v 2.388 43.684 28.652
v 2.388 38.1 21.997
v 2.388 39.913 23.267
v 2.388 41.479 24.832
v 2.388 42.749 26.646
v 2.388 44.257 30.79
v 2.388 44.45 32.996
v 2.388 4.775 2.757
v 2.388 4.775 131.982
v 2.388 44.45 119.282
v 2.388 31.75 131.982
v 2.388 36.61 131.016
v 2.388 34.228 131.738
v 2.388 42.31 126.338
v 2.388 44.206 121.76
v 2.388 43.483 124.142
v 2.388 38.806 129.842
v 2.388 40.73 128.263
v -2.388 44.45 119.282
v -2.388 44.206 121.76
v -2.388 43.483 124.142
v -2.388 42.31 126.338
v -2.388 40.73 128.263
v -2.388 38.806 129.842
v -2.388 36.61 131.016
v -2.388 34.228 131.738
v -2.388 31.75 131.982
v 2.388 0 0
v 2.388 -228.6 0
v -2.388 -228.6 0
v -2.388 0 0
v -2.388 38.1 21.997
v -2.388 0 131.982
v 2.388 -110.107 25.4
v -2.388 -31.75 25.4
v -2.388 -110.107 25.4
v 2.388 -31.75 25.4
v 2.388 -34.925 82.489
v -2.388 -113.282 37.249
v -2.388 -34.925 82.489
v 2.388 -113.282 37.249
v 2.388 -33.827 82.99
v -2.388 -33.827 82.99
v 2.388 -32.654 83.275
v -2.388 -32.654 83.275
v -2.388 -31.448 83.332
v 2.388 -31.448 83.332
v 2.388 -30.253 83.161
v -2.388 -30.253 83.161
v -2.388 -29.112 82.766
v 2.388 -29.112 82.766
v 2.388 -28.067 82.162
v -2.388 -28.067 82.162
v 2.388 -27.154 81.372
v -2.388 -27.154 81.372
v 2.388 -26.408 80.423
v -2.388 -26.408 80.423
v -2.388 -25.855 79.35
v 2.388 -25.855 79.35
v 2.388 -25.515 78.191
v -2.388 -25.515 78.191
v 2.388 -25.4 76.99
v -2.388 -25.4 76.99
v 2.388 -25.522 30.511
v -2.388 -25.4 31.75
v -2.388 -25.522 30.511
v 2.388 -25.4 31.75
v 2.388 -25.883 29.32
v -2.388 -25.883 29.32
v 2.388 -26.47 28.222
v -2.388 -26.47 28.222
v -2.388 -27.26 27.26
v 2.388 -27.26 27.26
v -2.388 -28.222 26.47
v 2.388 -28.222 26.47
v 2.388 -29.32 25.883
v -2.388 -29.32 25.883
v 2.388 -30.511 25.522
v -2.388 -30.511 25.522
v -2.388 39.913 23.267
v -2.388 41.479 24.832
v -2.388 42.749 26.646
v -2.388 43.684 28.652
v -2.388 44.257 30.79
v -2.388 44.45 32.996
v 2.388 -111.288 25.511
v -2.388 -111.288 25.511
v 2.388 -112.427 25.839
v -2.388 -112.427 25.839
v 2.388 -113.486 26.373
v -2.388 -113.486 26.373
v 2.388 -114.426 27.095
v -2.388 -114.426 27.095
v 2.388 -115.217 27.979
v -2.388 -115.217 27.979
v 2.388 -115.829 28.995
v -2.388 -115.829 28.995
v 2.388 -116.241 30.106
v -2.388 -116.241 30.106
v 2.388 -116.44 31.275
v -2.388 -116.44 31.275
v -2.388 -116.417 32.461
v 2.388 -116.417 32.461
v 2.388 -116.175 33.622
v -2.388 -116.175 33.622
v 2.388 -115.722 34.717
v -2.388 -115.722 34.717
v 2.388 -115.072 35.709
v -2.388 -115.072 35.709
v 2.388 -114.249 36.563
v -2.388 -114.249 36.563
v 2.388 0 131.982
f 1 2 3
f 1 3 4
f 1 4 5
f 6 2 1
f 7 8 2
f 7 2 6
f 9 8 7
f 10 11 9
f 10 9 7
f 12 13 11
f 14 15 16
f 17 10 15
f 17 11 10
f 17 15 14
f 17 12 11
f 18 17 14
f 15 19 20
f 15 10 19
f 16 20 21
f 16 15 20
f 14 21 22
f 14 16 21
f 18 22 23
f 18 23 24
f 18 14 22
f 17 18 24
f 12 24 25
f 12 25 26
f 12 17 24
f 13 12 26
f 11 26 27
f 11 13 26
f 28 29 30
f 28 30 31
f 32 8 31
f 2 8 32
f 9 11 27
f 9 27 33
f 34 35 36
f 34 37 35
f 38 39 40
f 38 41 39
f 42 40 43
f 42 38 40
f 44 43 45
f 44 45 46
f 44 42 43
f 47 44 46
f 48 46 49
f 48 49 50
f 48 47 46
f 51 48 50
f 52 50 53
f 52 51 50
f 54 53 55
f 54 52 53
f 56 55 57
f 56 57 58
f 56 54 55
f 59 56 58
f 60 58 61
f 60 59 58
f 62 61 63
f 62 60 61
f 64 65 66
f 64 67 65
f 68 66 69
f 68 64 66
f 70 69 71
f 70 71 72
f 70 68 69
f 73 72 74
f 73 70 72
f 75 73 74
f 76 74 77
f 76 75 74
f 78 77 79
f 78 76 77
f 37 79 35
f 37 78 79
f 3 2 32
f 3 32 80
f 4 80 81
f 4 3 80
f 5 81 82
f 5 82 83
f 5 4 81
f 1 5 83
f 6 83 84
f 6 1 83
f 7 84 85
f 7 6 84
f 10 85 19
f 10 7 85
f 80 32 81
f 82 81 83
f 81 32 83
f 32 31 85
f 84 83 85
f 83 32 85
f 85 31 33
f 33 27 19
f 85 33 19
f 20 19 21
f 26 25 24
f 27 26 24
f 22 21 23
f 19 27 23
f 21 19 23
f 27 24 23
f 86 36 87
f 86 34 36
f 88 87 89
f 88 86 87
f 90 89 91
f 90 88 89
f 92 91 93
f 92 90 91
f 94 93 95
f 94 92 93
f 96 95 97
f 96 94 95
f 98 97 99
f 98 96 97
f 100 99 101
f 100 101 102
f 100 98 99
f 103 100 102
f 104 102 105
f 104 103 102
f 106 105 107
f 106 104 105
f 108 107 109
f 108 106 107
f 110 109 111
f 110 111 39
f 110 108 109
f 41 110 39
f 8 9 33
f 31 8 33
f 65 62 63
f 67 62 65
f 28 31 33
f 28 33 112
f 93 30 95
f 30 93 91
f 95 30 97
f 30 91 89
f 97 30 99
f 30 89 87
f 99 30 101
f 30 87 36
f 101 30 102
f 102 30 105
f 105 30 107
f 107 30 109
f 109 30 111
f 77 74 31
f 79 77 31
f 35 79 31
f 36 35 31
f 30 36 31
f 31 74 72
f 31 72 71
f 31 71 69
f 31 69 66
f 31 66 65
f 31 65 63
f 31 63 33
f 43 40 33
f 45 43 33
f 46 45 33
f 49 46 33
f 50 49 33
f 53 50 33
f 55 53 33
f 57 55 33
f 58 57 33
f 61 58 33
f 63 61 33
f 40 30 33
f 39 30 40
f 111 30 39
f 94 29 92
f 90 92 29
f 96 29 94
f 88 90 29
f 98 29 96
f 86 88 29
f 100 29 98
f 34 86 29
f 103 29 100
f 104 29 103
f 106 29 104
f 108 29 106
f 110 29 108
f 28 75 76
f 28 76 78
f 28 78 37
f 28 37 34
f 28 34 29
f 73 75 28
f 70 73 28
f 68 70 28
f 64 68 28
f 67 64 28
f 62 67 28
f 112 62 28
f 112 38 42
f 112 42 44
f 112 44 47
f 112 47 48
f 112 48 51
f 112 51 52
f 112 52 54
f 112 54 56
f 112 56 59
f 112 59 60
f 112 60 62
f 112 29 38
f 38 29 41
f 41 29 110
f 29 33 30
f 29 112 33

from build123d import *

# Parameters (mm, degrees)
F1_DEPTH = 2.3876
F3_DEPTH = 2.3876
F5_DEPTH = 131.983272


with BuildPart() as f1:
    # F0 (on Right) → F1 (new body, symmetric)
    with BuildSketch(Plane.YZ):
        Polygon((0, 131.982272), (-228.6, 0), (0, 0), align=None)
        with BuildLine():
            Line((-25.4, 76.989658), (-25.4, 31.75))
            ThreePointArc((-25.4, 31.75), (-27.259872, 27.259872), (-31.75, 25.4))
            Line((-31.75, 25.4), (-110.107387, 25.4))
            ThreePointArc((-110.107387, 25.4), (-116.241016, 30.106499), (-113.282387, 37.249261))
            Line((-113.282387, 37.249261), (-34.925, 82.48892))
            ThreePointArc((-34.925, 82.48892), (-28.575, 82.48892), (-25.4, 76.989658))
        make_face(mode=Mode.SUBTRACT)
    extrude(amount=F1_DEPTH, both=True)

    # F2 (on Right) → F3 (join, symmetric)
    with BuildSketch(Plane.YZ):
        with BuildLine():
            Line((31.75, 131.982272), (0, 131.982272))
            Line((0, 131.982272), (0, 0))
            Line((0, 0), (38.1, 21.997045))
            ThreePointArc((38.1, 21.997045), (42.748523, 26.645568), (44.45, 32.995568))
            Line((44.45, 32.995568), (44.45, 119.282272))
            ThreePointArc((44.45, 119.282272), (40.730256, 128.262528), (31.75, 131.982272))
        make_face()
    extrude(amount=F3_DEPTH, both=True)

    # F4 (on Top) → F5 (cut, through all)
    with BuildSketch(Plane.XY):
        Polygon((2.3876, 4.7752), (-2.3876, 0), (2.3876, 0), align=None)
    extrude(amount=F5_DEPTH, mode=Mode.SUBTRACT)


solid = f1.part
